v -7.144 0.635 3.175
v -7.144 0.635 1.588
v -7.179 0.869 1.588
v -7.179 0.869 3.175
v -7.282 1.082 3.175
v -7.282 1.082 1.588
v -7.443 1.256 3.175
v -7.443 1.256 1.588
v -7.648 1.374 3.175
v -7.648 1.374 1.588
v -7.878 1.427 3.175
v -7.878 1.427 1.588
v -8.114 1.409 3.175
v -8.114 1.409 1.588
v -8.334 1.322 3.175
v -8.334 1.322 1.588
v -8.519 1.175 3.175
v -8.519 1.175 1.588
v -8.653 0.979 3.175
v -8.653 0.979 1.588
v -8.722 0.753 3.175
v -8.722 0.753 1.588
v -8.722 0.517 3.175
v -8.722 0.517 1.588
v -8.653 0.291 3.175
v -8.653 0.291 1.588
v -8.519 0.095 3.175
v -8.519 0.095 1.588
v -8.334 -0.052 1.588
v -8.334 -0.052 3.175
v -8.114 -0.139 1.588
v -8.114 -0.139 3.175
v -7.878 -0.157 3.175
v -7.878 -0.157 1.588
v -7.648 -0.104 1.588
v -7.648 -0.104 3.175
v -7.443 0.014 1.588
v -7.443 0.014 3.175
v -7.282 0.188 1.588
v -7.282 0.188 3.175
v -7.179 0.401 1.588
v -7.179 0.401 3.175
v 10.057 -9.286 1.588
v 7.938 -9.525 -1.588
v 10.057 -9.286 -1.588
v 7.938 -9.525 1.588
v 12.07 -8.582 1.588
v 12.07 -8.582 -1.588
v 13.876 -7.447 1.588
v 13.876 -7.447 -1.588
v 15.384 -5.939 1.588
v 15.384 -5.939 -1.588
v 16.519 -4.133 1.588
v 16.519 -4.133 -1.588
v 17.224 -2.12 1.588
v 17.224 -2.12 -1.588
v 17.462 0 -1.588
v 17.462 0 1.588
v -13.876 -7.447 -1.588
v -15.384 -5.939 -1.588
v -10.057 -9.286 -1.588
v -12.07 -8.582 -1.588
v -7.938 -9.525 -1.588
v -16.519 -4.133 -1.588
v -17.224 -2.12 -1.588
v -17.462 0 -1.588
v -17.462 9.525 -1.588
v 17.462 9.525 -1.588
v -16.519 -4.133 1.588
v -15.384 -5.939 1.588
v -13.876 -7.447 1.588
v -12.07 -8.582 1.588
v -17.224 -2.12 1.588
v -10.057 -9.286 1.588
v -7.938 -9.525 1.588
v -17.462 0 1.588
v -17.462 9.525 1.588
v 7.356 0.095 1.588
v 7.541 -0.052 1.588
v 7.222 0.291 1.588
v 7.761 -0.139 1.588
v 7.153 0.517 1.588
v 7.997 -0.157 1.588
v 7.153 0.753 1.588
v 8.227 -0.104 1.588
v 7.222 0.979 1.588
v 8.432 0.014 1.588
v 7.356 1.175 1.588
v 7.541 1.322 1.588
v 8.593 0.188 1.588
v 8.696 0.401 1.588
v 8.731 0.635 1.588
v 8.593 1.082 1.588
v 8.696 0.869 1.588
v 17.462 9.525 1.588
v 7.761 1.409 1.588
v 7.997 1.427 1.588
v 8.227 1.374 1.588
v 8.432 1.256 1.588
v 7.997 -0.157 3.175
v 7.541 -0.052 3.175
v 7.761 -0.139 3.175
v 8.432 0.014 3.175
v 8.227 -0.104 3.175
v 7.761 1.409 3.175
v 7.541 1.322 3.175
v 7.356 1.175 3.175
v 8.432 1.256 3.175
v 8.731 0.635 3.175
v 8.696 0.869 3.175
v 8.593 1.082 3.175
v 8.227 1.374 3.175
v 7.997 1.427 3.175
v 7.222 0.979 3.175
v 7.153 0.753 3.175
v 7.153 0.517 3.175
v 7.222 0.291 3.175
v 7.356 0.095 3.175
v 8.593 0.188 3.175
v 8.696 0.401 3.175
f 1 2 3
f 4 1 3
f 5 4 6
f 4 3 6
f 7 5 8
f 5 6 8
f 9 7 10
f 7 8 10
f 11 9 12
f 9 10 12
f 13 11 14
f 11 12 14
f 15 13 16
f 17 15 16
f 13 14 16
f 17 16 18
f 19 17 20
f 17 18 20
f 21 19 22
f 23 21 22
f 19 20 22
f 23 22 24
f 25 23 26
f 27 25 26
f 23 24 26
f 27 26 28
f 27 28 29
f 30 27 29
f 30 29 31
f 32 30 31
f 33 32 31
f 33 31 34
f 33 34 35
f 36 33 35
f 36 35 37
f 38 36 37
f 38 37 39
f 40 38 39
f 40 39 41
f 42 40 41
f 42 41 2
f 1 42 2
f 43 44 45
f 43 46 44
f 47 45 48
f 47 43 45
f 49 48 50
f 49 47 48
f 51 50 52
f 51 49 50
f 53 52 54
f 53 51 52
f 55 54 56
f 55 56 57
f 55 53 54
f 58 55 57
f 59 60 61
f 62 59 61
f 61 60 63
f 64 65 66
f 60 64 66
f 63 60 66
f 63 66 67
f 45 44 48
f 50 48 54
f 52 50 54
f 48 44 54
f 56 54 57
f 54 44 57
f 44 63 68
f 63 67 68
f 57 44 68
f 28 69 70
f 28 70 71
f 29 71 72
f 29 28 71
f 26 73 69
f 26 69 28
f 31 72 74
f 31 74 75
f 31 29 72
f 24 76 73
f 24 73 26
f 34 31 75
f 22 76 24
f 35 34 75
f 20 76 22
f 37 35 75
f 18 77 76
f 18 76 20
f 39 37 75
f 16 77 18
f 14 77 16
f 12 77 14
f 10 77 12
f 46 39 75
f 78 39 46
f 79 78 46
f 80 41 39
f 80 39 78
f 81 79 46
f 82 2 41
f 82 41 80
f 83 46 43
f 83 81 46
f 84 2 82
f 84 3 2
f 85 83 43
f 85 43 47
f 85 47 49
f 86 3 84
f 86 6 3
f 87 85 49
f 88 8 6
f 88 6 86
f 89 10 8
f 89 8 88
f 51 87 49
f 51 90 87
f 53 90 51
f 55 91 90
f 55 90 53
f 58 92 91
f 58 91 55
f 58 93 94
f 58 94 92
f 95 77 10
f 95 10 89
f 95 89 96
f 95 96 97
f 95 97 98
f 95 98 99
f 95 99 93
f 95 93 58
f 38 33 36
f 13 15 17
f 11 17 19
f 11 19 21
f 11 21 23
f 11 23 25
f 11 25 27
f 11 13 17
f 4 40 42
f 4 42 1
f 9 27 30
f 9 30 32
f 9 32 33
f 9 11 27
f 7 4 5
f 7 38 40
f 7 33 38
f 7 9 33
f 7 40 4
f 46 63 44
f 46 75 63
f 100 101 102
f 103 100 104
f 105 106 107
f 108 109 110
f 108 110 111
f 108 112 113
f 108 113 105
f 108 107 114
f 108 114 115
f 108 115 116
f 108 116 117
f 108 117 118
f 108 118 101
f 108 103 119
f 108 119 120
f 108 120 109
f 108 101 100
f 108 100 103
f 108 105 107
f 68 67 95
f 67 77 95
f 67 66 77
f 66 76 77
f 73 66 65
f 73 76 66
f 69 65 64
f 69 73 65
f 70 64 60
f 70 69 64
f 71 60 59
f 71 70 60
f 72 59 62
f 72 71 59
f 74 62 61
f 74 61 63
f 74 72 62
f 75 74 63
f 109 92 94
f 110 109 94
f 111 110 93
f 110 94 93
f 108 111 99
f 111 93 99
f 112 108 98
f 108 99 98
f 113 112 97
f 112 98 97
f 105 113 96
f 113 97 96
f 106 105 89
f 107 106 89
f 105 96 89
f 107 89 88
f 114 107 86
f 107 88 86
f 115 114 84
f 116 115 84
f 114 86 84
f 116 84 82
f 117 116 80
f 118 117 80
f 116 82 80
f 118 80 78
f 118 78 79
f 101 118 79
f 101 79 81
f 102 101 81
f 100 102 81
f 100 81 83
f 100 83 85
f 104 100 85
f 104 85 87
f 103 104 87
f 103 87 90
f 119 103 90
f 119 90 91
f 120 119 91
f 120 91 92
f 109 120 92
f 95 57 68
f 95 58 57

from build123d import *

# Parameters (mm, degrees)
F0_W     = 34.925
F0_H     = 19.05
F0_R     = 0.79375
F1_DEPTH = 1.5875
F2_DEPTH = 3.175
F3_R     = 9.525


with BuildPart() as f1:
    # F0 (on Top) → F1 (new body, symmetric)
    with BuildSketch(Plane.XY):
        Rectangle(F0_W, F0_H)
        with Locations((-7.9375, 0.635)):
            Circle(F0_R, mode=Mode.SUBTRACT)
        with Locations((7.9375, 0.635)):
            Circle(F0_R, mode=Mode.SUBTRACT)
        with Locations((-7.9375, 0.635)):
            Circle(F0_R)
        with Locations((7.9375, 0.635)):
            Circle(F0_R)
    extrude(amount=F1_DEPTH, both=True)

    # F0 (on Top) → F2 (join)
    with BuildSketch(Plane.XY):
        with Locations((-7.9375, 0.635)):
            Circle(F0_R)
        with Locations((7.9375, 0.635)):
            Circle(F0_R)
    extrude(amount=F2_DEPTH)

    # F3
    f3_edges = [f1.edges().sort_by_distance(p)[0] for p in [
        (17.4625, -9.525, 0),
        (-17.4625, -9.525, 0),
    ]]
    fillet(f3_edges, radius=F3_R)


solid = f1.part
